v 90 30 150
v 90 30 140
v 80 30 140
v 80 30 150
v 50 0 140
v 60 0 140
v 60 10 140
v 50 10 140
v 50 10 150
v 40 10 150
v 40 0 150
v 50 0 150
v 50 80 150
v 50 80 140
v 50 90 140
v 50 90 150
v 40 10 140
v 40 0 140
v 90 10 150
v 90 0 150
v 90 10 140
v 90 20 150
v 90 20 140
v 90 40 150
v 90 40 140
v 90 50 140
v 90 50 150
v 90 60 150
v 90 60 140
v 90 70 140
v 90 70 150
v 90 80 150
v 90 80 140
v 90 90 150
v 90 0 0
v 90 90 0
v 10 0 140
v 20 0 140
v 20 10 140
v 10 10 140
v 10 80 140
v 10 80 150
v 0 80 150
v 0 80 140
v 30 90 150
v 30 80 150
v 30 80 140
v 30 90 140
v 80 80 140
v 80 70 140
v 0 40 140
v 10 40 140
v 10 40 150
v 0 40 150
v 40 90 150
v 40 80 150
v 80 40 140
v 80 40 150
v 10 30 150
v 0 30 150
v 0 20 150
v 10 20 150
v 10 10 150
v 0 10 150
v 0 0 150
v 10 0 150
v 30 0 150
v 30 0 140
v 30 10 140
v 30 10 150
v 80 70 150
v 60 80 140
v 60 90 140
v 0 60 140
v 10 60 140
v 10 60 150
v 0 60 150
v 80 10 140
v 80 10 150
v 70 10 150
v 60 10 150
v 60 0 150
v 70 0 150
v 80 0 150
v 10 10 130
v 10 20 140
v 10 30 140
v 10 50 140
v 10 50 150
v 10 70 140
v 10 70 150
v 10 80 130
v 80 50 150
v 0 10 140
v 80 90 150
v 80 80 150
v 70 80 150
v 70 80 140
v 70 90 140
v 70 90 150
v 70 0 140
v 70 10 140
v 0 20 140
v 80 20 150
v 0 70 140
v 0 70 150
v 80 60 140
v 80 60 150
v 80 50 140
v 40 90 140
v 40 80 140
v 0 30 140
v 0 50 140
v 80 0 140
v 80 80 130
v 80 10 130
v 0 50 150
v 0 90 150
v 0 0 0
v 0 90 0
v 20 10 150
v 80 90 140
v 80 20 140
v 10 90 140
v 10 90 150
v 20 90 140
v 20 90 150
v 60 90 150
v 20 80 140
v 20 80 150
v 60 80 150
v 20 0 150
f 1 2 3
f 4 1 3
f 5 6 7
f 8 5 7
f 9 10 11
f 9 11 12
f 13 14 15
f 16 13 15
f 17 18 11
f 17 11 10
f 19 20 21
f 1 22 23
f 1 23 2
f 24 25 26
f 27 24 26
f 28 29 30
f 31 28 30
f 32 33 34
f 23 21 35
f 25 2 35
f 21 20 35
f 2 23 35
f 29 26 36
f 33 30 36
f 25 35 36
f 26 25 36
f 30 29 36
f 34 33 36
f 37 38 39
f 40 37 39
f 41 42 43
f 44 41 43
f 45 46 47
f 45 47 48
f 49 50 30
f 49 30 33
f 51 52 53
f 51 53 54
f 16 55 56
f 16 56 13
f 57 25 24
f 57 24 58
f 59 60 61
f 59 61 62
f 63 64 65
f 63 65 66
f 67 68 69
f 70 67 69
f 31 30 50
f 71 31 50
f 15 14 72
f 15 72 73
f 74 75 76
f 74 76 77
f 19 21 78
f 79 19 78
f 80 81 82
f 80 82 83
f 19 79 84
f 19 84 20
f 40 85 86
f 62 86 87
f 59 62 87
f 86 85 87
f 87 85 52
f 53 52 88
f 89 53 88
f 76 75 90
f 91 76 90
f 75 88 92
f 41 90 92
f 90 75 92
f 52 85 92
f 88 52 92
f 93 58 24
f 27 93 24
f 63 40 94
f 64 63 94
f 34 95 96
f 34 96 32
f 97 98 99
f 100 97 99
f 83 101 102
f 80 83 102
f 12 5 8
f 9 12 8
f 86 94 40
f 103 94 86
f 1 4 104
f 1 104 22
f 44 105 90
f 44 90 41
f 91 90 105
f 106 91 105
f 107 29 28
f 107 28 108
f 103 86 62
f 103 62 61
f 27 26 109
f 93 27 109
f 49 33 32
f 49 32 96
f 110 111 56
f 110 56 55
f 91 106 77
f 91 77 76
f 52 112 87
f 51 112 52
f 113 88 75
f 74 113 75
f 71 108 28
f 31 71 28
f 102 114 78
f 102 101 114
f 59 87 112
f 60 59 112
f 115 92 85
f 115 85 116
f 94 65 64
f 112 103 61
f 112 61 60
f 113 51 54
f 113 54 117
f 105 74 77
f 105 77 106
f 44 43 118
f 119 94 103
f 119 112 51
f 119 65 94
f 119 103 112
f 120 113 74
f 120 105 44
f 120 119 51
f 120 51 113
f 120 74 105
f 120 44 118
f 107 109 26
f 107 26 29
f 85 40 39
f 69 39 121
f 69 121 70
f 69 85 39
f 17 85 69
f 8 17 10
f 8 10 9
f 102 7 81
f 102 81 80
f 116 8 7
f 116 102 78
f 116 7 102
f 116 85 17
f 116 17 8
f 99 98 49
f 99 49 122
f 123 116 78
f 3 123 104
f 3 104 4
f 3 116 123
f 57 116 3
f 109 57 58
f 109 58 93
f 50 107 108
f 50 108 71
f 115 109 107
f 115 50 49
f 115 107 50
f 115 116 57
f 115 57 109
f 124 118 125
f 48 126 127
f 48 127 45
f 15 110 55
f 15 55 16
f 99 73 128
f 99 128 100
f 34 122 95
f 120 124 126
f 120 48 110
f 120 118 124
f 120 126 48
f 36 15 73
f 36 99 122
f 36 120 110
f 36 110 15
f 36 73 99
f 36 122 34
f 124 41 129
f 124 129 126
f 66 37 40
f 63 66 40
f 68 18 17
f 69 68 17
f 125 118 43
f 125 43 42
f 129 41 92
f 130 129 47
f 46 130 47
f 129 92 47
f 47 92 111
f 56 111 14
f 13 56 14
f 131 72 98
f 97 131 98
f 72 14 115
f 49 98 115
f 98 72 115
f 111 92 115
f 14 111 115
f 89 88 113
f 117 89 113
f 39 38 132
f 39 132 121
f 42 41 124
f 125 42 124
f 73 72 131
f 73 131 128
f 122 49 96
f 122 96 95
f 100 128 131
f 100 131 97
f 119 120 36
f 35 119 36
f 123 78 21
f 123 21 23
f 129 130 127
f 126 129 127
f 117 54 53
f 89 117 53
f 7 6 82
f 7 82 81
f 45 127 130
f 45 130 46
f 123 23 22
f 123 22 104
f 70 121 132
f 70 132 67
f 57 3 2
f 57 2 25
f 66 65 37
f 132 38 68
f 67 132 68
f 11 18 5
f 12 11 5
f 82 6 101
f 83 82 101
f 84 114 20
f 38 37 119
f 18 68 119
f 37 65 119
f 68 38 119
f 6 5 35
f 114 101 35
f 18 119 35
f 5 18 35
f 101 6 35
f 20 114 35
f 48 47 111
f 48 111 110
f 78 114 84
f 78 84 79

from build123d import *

# Parameters (mm, degrees)
BOX003_W                 = 10
BOX003_H                 = 110
BOX003_DEPTH             = 10
ARRAY001_X_COUNT         = 4
ARRAY001_X_PITCH         = 20
ARRAY001_PLACEMENT_ANGLE = 90
BOX002_W                 = 10
BOX002_H                 = 110
BOX002_DEPTH             = 10
ARRAY_X_COUNT            = 4
ARRAY_X_PITCH            = 20
BOX001_W                 = 70
BOX001_H                 = 70
BOX001_DEPTH             = 30
BOX_W                    = 90
BOX_H                    = 90
BOX_DEPTH                = 150


with BuildPart() as almenas_y:
    # Box003 → Box003 (new body)
    with BuildSketch(Plane.XY):
        with Locations((5, 55)):
            Rectangle(BOX003_W, BOX003_H)
    extrude(amount=BOX003_DEPTH)

    # Array001 X: almenas_y ×4


with BuildPart() as almenas_y_1:
    add(almenas_y.part)
    with Locations(*[(i * ARRAY001_X_PITCH, 0, 0) for i in range(1, ARRAY001_X_COUNT)]):
        add(almenas_y.part)


with BuildPart() as almenas_y_2:
    # Array001 placement: moved
    add(almenas_y_1.part.moved(Location((90, 20, 0))).rotate(Axis((90, 20, 0), (0, 0, 1)), ARRAY001_PLACEMENT_ANGLE))


with BuildPart() as almena_resta:
    # Box002 → Box002 (new body)
    with BuildSketch(Plane.XY):
        with Locations((5, 55)):
            Rectangle(BOX002_W, BOX002_H)
    extrude(amount=BOX002_DEPTH)

    # Array X: almena_resta ×4


with BuildPart() as almena_resta_1:
    add(almena_resta.part)
    with Locations(*[(i * ARRAY_X_PITCH, 0, 0) for i in range(1, ARRAY_X_COUNT)]):
        add(almena_resta.part)

    # Fusion: union almenas_y
    add(almenas_y_2.part)


with BuildPart() as almena_resta_2:
    # Fusion placement: moved
    add(almena_resta_1.part.moved(Location((10, -10, 140))))


with BuildPart() as azotea_resta:
    # Box001 → Box001 (new body)
    with BuildSketch(Plane(origin=(10, 10, 130), x_dir=(1, 0, 0), z_dir=(0, 0, 1))):
        with Locations((35, 35)):
            Rectangle(BOX001_W, BOX001_H)
    extrude(amount=BOX001_DEPTH)


with BuildPart() as torre_almenas:
    # Box → Box (new body)
    with BuildSketch(Plane.XY):
        with Locations((45, 45)):
            Rectangle(BOX_W, BOX_H)
    extrude(amount=BOX_DEPTH)

    # Cut: cut azotea_resta
    add(azotea_resta.part, mode=Mode.SUBTRACT)

    # Cut001: cut almena_resta
    add(almena_resta_2.part, mode=Mode.SUBTRACT)


solid = torre_almenas.part
